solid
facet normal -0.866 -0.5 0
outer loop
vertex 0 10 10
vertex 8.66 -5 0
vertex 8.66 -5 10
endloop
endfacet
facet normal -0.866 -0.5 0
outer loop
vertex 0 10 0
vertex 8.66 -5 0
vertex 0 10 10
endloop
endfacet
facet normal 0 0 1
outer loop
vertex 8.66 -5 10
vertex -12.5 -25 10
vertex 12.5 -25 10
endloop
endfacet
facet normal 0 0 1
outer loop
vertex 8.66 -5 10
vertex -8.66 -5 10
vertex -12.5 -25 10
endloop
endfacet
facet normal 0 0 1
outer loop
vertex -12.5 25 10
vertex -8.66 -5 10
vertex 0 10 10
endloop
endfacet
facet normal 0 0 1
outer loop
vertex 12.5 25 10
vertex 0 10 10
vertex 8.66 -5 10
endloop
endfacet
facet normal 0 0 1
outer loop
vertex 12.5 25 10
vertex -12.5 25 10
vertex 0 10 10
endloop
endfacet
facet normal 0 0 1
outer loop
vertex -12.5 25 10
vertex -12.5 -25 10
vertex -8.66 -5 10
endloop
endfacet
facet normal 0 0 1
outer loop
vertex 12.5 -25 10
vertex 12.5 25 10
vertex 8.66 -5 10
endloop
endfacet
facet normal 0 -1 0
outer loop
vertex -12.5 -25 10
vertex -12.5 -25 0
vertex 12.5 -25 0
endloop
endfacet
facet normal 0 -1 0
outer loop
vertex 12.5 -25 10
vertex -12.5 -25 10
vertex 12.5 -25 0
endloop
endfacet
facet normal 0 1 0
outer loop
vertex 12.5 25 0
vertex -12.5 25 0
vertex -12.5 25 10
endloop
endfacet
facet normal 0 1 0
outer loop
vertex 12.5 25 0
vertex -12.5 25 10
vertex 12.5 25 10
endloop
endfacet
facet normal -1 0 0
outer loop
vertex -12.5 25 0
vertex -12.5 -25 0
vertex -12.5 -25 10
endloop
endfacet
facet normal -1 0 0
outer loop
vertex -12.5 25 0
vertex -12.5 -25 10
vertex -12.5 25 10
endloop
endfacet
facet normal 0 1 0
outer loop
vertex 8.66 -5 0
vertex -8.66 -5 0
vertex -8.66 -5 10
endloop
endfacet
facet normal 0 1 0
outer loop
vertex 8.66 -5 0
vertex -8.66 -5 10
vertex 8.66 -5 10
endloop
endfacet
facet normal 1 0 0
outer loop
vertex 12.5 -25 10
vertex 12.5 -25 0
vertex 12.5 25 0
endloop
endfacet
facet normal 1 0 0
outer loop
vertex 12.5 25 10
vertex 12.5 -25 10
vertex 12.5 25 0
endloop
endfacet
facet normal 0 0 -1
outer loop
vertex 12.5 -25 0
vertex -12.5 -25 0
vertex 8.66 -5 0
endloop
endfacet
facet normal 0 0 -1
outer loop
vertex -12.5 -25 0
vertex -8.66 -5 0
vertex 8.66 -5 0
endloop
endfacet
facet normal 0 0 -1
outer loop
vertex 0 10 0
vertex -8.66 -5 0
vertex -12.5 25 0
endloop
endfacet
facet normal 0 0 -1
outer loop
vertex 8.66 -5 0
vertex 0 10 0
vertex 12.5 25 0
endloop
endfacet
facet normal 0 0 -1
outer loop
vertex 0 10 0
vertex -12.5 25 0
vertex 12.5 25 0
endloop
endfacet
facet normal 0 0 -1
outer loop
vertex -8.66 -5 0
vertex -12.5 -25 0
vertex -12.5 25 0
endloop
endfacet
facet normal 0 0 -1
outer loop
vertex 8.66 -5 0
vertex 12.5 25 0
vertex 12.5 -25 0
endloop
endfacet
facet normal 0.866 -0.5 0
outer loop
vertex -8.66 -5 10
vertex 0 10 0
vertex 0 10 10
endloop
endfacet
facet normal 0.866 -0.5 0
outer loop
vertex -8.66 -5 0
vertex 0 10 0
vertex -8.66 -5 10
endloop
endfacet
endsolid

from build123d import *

# Parameters (mm, degrees)
F0_W     = 25
F0_H     = 50
F1_DEPTH = 10
F3_DEPTH = 10.001


with BuildPart() as f1:
    # F0 (on Top) → F1 (new body)
    with BuildSketch(Plane.XY):
        Rectangle(F0_W, F0_H)
    extrude(amount=F1_DEPTH)

    # F2 (on Top) → F3 (cut, through all)
    with BuildSketch(Plane.XY):
        Polygon((0, 10), (-8.660254, -5), (8.660254, -5), align=None)
    extrude(amount=F3_DEPTH, mode=Mode.SUBTRACT)


solid = f1.part
